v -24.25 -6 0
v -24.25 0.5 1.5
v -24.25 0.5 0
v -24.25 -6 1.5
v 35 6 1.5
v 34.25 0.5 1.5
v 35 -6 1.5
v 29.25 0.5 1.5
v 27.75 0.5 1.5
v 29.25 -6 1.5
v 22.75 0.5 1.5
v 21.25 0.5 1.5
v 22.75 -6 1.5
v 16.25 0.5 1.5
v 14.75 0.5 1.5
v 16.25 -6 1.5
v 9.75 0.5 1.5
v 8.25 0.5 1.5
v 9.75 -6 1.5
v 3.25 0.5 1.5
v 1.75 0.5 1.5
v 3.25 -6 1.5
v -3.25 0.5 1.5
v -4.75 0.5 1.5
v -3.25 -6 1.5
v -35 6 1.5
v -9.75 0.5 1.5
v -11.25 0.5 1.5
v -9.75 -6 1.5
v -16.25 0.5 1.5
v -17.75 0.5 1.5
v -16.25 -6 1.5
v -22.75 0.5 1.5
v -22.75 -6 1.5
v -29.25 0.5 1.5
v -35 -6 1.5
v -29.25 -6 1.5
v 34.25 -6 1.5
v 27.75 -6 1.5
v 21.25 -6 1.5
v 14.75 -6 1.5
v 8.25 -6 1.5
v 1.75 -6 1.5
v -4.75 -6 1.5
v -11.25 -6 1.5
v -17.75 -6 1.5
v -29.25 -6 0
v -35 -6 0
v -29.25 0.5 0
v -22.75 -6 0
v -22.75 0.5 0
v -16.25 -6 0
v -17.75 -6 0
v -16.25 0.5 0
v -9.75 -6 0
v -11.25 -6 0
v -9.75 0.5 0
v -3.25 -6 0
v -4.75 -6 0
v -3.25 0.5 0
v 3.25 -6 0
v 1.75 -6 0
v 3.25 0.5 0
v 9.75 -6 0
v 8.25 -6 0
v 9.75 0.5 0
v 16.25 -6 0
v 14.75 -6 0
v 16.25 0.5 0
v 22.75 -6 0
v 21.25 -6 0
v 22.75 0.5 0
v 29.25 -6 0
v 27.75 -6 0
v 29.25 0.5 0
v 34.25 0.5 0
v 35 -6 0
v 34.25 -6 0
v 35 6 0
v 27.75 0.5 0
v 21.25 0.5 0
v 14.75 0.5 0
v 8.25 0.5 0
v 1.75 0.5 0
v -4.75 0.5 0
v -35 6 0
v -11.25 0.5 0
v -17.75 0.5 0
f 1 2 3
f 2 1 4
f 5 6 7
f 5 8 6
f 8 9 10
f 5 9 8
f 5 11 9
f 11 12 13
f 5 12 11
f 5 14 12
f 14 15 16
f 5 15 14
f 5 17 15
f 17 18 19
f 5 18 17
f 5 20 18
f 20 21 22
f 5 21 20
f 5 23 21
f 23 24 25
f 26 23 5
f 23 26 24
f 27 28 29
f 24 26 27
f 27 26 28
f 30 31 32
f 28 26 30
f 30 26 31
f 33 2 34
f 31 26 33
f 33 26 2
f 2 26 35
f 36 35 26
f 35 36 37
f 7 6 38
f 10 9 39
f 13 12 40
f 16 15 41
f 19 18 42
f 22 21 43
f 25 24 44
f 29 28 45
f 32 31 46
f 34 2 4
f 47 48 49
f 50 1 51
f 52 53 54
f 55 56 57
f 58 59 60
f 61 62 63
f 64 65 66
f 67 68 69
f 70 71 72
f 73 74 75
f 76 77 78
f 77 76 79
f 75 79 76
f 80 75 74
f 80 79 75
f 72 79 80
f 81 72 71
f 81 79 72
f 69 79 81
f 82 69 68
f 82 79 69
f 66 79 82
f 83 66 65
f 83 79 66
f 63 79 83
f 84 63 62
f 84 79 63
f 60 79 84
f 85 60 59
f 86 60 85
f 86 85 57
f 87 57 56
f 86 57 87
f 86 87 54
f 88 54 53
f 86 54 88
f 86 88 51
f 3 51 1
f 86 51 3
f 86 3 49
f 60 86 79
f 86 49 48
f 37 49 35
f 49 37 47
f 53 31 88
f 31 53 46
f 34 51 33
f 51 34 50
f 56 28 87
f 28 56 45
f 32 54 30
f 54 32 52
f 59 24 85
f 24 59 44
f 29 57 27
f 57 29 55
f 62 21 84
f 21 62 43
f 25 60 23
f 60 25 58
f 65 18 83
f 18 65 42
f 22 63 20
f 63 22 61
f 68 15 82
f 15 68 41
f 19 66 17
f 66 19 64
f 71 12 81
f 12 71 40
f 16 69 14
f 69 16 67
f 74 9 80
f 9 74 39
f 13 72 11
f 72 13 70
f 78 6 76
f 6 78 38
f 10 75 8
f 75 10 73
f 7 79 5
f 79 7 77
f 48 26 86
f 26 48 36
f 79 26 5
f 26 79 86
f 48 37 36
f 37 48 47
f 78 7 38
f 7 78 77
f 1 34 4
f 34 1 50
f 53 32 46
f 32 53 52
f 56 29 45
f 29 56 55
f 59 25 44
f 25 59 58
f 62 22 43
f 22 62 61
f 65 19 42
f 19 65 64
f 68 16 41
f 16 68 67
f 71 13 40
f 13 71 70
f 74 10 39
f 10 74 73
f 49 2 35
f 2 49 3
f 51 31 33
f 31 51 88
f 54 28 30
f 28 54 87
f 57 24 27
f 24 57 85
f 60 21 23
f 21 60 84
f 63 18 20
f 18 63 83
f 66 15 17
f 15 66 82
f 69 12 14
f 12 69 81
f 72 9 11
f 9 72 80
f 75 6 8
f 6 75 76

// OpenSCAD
// 10-well comb for casting agarose gels
// Print orientation: flat on bed, teeth pointing down (-Y)

// ---------- Parameters ----------
plate_t      = 1.5;   // plate thickness (Z)
spine_len    = 70;    // spine length (X)
spine_w      = 12;    // spine width (Y)
tooth_w      = 5.0;   // tooth width (X)
tooth_len    = 12;    // tooth length (Y)
tooth_count  = 10;    // number of teeth
tooth_gap    = 1.5;   // gap between neighbouring teeth (X)
eps          = 0.5;   // cutter overshoot past faces

$fn = 64;

// ---------- Derived ----------
pitch   = tooth_w + tooth_gap;          // centre-to-centre spacing of teeth
x_start = -(tooth_count - 1) * pitch / 2; // first tooth centre (row centred on spine)

// ---------- Model ----------
difference() {
    union() {
        // Spine (back bar)
        translate([-spine_len / 2, -spine_w / 2, 0])
            cube([spine_len, spine_w, plate_t]);

        // Teeth
        for (i = [0 : tooth_count - 1])
            translate([x_start + i * pitch, -tooth_len, 0])
                cube([tooth_w, tooth_len, plate_t]);
    }

    // Teeth cutters, extending past -Y face
    for (i = [0 : tooth_count - 1])
        translate([x_start + i * pitch, -tooth_len - eps, 0])
            cube([tooth_w, tooth_len + 2 * eps, plate_t + eps]);
}
